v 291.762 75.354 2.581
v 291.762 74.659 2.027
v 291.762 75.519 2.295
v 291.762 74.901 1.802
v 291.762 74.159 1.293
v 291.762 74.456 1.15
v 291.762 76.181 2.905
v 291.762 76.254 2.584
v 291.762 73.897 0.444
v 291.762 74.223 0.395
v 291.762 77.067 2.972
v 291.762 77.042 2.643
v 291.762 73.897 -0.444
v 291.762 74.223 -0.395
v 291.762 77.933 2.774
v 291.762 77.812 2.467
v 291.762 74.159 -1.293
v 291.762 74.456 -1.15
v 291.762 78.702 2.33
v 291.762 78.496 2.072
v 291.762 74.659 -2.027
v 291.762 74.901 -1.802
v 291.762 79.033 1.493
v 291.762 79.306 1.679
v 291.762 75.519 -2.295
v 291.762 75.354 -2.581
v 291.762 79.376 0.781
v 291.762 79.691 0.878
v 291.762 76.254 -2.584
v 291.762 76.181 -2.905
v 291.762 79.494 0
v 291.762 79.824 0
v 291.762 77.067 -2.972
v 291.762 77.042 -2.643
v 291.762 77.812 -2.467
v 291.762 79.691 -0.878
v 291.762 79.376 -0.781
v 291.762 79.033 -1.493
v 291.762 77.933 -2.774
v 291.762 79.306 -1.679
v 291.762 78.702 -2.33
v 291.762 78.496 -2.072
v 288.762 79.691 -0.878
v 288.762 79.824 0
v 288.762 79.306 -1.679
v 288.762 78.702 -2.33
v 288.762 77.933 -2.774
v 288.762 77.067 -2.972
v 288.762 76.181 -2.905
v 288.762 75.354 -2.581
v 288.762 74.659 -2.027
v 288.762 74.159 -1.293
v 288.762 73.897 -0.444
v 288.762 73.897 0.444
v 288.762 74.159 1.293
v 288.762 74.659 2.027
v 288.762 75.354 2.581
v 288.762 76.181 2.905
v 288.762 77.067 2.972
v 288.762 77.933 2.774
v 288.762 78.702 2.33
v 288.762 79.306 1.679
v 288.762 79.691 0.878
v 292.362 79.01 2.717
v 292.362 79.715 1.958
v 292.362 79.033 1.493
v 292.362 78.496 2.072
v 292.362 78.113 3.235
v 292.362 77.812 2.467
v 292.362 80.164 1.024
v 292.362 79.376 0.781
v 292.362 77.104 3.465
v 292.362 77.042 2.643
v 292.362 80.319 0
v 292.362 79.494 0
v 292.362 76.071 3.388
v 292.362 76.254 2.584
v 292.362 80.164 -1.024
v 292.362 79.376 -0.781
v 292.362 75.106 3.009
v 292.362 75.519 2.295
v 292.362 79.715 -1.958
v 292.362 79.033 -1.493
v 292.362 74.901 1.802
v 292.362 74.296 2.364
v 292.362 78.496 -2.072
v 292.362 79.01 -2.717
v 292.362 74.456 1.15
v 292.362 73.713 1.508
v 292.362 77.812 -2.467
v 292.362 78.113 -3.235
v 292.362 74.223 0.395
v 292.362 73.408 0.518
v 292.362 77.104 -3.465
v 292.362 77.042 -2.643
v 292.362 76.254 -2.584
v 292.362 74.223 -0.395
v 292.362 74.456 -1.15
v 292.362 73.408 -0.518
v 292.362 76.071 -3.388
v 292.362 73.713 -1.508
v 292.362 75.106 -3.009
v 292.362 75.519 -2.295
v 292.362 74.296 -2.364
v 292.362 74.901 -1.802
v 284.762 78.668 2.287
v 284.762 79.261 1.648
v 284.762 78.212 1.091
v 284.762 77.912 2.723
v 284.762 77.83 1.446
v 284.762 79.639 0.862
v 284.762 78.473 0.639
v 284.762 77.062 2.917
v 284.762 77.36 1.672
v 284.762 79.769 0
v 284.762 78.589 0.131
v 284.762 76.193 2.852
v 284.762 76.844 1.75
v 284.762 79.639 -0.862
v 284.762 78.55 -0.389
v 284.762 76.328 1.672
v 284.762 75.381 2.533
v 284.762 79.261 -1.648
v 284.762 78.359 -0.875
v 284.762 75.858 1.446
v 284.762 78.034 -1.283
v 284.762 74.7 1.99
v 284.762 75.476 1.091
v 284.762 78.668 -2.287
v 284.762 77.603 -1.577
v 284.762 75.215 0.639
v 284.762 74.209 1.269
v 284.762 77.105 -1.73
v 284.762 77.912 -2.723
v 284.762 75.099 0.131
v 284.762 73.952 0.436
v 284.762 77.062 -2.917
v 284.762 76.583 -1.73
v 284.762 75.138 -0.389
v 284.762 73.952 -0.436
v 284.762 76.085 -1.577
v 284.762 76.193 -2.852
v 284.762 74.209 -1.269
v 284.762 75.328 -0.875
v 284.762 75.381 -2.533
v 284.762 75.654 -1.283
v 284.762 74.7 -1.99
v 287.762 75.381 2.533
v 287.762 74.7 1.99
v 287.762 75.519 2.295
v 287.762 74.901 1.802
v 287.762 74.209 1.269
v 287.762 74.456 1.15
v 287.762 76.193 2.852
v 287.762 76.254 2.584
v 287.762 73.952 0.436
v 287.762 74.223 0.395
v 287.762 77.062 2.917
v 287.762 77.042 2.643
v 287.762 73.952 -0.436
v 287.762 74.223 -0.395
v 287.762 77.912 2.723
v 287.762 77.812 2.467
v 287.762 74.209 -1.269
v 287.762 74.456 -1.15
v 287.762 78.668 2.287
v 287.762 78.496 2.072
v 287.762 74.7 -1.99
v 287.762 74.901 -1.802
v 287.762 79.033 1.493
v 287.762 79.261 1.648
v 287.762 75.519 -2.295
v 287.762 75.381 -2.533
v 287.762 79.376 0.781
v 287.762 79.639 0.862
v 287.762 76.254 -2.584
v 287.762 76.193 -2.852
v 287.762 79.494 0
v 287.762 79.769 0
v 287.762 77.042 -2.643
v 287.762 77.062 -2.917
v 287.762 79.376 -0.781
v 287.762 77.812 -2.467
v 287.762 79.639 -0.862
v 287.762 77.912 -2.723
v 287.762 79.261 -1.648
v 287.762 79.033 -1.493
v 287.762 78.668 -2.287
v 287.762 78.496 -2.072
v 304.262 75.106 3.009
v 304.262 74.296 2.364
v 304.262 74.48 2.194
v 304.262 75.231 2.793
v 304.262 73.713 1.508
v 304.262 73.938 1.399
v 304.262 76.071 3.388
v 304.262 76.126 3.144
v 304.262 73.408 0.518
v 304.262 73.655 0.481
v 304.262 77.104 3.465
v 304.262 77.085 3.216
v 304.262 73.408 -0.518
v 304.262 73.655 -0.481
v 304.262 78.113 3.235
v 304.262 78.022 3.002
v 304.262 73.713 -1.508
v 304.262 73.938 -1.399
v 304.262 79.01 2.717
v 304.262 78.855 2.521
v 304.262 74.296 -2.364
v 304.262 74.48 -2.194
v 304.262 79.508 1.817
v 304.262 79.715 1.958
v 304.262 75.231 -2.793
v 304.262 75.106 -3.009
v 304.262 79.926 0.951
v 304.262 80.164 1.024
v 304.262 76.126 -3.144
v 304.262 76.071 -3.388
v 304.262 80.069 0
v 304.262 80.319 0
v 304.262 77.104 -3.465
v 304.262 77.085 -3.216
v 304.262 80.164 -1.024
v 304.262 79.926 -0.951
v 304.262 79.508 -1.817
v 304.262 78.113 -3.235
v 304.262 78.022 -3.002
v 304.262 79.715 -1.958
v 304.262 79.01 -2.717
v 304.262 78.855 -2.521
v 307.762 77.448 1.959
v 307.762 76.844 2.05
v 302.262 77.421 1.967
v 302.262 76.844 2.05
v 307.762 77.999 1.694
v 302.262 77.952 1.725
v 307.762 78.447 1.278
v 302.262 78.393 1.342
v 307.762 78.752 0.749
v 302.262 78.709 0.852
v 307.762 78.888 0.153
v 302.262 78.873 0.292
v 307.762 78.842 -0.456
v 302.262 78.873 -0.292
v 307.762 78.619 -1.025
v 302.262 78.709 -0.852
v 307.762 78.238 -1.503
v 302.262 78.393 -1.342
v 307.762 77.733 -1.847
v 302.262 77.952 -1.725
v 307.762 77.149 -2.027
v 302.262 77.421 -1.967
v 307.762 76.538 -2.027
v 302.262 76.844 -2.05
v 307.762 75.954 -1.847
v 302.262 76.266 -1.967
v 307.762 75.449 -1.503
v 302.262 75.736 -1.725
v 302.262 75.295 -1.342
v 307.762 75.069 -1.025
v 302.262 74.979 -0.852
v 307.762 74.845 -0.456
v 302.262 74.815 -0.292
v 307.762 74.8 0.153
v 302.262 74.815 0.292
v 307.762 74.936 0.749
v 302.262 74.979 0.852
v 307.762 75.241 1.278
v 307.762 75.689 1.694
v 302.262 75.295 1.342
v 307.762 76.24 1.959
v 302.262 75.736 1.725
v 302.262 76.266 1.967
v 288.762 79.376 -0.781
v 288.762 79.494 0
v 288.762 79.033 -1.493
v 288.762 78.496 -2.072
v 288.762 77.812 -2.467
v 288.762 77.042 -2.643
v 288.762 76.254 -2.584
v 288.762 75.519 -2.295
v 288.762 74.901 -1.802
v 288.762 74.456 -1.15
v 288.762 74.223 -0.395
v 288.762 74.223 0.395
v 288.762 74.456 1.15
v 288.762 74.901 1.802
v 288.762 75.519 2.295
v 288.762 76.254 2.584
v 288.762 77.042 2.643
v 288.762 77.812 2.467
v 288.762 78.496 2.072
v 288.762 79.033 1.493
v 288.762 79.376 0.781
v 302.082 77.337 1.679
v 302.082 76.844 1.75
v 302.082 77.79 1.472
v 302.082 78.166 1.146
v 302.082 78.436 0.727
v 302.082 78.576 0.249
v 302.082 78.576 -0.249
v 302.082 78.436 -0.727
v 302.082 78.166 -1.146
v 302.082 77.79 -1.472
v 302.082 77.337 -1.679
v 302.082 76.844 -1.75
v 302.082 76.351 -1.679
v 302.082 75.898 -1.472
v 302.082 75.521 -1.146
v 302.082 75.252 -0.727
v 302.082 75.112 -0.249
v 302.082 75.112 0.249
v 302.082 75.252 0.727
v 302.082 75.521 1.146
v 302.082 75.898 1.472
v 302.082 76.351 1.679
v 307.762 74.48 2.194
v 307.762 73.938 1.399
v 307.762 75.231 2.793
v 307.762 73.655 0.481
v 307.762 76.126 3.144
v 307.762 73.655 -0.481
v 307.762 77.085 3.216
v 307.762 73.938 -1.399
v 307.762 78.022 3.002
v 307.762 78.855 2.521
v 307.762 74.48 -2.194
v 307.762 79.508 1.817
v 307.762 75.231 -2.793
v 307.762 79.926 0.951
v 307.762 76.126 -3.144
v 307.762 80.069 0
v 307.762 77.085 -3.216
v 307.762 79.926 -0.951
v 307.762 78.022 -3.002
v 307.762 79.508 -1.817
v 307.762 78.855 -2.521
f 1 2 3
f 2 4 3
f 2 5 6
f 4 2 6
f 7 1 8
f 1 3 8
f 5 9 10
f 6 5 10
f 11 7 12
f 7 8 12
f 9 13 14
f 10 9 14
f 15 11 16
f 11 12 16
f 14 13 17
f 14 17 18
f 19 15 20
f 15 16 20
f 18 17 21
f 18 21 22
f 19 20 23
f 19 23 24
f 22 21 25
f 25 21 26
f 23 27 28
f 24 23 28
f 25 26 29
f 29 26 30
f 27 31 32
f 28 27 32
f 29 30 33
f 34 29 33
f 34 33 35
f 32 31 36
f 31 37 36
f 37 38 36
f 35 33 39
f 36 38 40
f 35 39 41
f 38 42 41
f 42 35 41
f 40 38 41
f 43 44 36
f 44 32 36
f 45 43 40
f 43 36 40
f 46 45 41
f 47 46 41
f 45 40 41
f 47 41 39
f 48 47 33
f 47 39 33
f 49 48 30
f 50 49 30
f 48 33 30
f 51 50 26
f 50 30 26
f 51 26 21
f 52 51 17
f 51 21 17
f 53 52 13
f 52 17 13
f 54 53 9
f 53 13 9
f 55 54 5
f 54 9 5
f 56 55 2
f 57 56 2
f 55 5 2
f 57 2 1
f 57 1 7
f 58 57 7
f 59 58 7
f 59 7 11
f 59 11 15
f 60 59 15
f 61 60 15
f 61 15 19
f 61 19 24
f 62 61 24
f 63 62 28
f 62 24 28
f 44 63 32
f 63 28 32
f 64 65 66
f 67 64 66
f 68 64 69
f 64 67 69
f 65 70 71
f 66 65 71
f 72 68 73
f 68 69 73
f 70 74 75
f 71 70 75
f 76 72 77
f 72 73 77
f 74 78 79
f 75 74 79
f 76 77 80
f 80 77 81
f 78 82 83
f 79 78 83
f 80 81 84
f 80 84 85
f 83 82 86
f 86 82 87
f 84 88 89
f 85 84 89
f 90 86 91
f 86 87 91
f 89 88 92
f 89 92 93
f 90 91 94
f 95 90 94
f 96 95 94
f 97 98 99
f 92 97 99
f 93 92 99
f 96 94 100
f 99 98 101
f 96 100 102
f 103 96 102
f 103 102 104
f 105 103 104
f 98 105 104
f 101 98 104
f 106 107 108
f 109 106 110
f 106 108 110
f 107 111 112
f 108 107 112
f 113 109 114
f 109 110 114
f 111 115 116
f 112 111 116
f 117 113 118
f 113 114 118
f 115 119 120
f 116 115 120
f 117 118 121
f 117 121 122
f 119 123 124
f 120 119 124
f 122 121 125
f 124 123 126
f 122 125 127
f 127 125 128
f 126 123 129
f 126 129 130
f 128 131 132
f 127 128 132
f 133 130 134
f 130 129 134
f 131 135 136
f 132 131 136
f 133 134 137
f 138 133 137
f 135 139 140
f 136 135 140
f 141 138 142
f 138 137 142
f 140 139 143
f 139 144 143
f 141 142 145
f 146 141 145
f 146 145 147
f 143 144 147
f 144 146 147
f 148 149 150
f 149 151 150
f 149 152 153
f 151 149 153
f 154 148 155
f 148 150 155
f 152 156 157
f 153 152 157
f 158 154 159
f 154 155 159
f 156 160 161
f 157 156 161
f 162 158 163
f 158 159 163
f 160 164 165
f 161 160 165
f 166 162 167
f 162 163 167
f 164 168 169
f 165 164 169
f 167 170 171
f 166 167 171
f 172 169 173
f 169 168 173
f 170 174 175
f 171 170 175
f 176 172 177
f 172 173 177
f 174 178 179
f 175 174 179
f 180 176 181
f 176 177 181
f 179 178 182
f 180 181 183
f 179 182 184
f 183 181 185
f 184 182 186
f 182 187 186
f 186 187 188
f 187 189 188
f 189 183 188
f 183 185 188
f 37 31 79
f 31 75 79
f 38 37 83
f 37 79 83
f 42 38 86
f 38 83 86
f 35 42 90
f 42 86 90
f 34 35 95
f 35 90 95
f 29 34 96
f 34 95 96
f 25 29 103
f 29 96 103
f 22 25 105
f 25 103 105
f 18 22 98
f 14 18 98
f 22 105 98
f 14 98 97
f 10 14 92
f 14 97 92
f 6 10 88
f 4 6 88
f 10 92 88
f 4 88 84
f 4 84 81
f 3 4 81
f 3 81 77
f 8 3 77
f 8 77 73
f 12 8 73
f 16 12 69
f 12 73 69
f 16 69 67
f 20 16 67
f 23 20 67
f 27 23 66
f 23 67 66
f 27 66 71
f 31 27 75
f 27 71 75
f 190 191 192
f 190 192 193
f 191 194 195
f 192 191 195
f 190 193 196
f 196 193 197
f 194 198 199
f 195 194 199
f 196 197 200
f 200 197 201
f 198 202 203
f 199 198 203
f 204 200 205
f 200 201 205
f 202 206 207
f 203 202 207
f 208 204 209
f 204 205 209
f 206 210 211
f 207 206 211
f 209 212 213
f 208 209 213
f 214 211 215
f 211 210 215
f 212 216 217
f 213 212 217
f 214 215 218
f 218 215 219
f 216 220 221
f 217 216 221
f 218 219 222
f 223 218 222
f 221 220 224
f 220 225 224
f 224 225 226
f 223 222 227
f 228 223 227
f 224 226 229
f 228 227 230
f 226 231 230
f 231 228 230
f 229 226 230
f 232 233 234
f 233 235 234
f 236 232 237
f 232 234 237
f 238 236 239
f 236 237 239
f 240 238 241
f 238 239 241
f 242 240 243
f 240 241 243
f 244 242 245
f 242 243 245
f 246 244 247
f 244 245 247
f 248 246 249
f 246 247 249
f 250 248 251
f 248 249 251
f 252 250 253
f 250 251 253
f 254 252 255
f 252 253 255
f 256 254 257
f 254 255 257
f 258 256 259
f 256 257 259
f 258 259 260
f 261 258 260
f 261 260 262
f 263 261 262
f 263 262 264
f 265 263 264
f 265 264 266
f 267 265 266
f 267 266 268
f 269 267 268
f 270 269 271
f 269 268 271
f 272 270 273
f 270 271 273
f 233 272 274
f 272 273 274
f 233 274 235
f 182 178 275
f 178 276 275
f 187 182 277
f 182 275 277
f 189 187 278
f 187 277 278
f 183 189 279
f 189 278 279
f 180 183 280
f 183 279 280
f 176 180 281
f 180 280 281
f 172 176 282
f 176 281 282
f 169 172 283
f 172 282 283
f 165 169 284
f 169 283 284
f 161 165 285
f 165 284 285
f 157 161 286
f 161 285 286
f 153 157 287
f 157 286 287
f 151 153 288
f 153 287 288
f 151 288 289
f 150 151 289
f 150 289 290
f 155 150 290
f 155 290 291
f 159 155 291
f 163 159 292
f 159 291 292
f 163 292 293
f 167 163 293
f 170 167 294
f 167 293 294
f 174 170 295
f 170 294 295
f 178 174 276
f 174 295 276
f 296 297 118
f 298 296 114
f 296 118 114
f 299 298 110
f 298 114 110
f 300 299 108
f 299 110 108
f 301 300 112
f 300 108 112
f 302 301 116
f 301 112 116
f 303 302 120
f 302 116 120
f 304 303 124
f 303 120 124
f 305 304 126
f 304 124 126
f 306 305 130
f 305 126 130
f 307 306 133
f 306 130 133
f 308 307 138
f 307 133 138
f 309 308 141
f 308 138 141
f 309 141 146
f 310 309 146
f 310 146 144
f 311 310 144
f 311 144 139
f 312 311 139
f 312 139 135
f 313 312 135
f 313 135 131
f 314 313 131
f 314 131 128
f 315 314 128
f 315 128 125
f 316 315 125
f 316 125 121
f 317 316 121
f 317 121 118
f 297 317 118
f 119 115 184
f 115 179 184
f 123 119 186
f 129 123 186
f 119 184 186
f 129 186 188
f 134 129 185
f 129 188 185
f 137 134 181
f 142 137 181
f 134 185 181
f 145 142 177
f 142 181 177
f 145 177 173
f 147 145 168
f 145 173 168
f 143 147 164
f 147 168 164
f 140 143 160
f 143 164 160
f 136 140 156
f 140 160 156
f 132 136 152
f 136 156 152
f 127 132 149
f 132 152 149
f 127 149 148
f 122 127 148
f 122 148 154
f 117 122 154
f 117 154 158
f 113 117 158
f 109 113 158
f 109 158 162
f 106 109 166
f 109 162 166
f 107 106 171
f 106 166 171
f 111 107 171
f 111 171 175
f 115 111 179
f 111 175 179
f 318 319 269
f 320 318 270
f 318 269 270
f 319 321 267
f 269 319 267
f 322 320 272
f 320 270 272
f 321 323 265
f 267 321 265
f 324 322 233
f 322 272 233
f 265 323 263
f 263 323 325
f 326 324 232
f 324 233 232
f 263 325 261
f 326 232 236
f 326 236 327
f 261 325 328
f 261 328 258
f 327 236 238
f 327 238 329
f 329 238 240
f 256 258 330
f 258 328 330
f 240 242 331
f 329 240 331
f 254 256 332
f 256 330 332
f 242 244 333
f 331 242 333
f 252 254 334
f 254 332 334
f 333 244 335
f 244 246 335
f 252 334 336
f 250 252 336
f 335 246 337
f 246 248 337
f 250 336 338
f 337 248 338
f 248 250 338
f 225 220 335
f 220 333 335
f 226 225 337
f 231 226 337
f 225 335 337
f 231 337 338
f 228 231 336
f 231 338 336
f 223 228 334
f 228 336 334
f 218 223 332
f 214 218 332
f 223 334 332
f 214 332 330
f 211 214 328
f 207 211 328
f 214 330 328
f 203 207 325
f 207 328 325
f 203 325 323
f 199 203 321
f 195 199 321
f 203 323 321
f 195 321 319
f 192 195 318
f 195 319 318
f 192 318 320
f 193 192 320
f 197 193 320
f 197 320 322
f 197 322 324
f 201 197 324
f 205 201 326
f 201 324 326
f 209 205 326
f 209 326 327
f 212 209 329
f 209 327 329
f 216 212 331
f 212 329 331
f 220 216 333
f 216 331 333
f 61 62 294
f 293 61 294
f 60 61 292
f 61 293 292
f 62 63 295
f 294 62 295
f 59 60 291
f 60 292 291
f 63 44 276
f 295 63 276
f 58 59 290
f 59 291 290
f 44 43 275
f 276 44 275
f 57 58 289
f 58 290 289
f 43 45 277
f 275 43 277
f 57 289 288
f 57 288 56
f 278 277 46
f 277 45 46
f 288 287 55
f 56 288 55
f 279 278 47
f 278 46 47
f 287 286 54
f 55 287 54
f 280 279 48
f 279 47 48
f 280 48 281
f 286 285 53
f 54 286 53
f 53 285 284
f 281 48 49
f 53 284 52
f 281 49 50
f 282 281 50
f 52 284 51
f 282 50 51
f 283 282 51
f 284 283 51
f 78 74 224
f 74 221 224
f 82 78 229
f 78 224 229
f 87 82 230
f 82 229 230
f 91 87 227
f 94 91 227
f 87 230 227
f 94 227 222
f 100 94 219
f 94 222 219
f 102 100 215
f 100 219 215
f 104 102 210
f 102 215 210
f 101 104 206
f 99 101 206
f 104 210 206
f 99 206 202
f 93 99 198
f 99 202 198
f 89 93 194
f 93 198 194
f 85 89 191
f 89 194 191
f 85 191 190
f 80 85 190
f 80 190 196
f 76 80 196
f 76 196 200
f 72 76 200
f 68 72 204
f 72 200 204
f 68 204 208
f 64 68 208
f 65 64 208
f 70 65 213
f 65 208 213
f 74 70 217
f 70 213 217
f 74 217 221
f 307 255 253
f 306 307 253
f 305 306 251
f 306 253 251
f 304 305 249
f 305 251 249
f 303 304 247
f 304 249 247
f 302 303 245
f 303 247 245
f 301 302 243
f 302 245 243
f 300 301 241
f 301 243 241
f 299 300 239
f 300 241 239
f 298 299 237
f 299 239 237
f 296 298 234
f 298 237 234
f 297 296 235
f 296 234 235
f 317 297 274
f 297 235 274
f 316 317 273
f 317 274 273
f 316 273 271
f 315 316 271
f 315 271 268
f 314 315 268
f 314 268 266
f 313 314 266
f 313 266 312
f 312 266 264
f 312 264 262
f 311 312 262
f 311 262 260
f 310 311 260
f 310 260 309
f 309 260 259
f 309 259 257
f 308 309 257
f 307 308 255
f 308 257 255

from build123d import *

# Parameters (mm, degrees)
TAP_DRILL_FOR_M5_TAP1_D     = 4.1
TAP_DRILL_FOR_M5_TAP1_DEPTH = 5.5
TAP_DRILL_FOR_M5_TAP1_TIP   = 1.231764269
SKETCH5_R                   = 1.75
CUT_EXTRUDE1_DEPTH          = 29.8


with BuildPart() as part:
    # Sketch2 → Revolve4 (revolve)
    with BuildSketch(Plane.XY):
        Polygon((292.362244726, 80.31885353), (304.262244726, 80.31885353), (304.262244726, 80.06885353), (307.762244726, 80.06885353), (307.762244726, 76.84385353), (284.762244726, 76.84385353), (284.762244726, 79.76885353), (287.762244726, 79.76885353), (287.762244726, 79.49385353), (288.762244726, 79.49385353), (288.762244726, 79.82385353), (291.762244726, 79.82385353), (291.762244726, 79.49385353), (292.362244726, 79.49385353), align=None)
    revolve(axis=Axis((307.762244726, 76.84385353, 0), (-1, 0, 0)))

    # Tap Drill for M5 Tap1
    with Locations(Plane(origin=(307.762244726, 0, 0), x_dir=(0, 0, -1), z_dir=(1, 0, 0))):
        with Locations((0, 76.84385353)):
            Hole(TAP_DRILL_FOR_M5_TAP1_D / 2, depth=TAP_DRILL_FOR_M5_TAP1_DEPTH)
            with Locations((0, 0, -(TAP_DRILL_FOR_M5_TAP1_DEPTH + TAP_DRILL_FOR_M5_TAP1_TIP / 2))):  # 118° drill point
                Cone(0, TAP_DRILL_FOR_M5_TAP1_D / 2, TAP_DRILL_FOR_M5_TAP1_TIP, mode=Mode.SUBTRACT)

    # Sketch5 → Cut-Extrude1 (cut)
    with BuildSketch(Plane.ZY.offset(-284.762244726)):
        with Locations((0, 76.84385353)):
            Circle(SKETCH5_R)
    extrude(amount=-CUT_EXTRUDE1_DEPTH, mode=Mode.SUBTRACT)


solid = part.part
